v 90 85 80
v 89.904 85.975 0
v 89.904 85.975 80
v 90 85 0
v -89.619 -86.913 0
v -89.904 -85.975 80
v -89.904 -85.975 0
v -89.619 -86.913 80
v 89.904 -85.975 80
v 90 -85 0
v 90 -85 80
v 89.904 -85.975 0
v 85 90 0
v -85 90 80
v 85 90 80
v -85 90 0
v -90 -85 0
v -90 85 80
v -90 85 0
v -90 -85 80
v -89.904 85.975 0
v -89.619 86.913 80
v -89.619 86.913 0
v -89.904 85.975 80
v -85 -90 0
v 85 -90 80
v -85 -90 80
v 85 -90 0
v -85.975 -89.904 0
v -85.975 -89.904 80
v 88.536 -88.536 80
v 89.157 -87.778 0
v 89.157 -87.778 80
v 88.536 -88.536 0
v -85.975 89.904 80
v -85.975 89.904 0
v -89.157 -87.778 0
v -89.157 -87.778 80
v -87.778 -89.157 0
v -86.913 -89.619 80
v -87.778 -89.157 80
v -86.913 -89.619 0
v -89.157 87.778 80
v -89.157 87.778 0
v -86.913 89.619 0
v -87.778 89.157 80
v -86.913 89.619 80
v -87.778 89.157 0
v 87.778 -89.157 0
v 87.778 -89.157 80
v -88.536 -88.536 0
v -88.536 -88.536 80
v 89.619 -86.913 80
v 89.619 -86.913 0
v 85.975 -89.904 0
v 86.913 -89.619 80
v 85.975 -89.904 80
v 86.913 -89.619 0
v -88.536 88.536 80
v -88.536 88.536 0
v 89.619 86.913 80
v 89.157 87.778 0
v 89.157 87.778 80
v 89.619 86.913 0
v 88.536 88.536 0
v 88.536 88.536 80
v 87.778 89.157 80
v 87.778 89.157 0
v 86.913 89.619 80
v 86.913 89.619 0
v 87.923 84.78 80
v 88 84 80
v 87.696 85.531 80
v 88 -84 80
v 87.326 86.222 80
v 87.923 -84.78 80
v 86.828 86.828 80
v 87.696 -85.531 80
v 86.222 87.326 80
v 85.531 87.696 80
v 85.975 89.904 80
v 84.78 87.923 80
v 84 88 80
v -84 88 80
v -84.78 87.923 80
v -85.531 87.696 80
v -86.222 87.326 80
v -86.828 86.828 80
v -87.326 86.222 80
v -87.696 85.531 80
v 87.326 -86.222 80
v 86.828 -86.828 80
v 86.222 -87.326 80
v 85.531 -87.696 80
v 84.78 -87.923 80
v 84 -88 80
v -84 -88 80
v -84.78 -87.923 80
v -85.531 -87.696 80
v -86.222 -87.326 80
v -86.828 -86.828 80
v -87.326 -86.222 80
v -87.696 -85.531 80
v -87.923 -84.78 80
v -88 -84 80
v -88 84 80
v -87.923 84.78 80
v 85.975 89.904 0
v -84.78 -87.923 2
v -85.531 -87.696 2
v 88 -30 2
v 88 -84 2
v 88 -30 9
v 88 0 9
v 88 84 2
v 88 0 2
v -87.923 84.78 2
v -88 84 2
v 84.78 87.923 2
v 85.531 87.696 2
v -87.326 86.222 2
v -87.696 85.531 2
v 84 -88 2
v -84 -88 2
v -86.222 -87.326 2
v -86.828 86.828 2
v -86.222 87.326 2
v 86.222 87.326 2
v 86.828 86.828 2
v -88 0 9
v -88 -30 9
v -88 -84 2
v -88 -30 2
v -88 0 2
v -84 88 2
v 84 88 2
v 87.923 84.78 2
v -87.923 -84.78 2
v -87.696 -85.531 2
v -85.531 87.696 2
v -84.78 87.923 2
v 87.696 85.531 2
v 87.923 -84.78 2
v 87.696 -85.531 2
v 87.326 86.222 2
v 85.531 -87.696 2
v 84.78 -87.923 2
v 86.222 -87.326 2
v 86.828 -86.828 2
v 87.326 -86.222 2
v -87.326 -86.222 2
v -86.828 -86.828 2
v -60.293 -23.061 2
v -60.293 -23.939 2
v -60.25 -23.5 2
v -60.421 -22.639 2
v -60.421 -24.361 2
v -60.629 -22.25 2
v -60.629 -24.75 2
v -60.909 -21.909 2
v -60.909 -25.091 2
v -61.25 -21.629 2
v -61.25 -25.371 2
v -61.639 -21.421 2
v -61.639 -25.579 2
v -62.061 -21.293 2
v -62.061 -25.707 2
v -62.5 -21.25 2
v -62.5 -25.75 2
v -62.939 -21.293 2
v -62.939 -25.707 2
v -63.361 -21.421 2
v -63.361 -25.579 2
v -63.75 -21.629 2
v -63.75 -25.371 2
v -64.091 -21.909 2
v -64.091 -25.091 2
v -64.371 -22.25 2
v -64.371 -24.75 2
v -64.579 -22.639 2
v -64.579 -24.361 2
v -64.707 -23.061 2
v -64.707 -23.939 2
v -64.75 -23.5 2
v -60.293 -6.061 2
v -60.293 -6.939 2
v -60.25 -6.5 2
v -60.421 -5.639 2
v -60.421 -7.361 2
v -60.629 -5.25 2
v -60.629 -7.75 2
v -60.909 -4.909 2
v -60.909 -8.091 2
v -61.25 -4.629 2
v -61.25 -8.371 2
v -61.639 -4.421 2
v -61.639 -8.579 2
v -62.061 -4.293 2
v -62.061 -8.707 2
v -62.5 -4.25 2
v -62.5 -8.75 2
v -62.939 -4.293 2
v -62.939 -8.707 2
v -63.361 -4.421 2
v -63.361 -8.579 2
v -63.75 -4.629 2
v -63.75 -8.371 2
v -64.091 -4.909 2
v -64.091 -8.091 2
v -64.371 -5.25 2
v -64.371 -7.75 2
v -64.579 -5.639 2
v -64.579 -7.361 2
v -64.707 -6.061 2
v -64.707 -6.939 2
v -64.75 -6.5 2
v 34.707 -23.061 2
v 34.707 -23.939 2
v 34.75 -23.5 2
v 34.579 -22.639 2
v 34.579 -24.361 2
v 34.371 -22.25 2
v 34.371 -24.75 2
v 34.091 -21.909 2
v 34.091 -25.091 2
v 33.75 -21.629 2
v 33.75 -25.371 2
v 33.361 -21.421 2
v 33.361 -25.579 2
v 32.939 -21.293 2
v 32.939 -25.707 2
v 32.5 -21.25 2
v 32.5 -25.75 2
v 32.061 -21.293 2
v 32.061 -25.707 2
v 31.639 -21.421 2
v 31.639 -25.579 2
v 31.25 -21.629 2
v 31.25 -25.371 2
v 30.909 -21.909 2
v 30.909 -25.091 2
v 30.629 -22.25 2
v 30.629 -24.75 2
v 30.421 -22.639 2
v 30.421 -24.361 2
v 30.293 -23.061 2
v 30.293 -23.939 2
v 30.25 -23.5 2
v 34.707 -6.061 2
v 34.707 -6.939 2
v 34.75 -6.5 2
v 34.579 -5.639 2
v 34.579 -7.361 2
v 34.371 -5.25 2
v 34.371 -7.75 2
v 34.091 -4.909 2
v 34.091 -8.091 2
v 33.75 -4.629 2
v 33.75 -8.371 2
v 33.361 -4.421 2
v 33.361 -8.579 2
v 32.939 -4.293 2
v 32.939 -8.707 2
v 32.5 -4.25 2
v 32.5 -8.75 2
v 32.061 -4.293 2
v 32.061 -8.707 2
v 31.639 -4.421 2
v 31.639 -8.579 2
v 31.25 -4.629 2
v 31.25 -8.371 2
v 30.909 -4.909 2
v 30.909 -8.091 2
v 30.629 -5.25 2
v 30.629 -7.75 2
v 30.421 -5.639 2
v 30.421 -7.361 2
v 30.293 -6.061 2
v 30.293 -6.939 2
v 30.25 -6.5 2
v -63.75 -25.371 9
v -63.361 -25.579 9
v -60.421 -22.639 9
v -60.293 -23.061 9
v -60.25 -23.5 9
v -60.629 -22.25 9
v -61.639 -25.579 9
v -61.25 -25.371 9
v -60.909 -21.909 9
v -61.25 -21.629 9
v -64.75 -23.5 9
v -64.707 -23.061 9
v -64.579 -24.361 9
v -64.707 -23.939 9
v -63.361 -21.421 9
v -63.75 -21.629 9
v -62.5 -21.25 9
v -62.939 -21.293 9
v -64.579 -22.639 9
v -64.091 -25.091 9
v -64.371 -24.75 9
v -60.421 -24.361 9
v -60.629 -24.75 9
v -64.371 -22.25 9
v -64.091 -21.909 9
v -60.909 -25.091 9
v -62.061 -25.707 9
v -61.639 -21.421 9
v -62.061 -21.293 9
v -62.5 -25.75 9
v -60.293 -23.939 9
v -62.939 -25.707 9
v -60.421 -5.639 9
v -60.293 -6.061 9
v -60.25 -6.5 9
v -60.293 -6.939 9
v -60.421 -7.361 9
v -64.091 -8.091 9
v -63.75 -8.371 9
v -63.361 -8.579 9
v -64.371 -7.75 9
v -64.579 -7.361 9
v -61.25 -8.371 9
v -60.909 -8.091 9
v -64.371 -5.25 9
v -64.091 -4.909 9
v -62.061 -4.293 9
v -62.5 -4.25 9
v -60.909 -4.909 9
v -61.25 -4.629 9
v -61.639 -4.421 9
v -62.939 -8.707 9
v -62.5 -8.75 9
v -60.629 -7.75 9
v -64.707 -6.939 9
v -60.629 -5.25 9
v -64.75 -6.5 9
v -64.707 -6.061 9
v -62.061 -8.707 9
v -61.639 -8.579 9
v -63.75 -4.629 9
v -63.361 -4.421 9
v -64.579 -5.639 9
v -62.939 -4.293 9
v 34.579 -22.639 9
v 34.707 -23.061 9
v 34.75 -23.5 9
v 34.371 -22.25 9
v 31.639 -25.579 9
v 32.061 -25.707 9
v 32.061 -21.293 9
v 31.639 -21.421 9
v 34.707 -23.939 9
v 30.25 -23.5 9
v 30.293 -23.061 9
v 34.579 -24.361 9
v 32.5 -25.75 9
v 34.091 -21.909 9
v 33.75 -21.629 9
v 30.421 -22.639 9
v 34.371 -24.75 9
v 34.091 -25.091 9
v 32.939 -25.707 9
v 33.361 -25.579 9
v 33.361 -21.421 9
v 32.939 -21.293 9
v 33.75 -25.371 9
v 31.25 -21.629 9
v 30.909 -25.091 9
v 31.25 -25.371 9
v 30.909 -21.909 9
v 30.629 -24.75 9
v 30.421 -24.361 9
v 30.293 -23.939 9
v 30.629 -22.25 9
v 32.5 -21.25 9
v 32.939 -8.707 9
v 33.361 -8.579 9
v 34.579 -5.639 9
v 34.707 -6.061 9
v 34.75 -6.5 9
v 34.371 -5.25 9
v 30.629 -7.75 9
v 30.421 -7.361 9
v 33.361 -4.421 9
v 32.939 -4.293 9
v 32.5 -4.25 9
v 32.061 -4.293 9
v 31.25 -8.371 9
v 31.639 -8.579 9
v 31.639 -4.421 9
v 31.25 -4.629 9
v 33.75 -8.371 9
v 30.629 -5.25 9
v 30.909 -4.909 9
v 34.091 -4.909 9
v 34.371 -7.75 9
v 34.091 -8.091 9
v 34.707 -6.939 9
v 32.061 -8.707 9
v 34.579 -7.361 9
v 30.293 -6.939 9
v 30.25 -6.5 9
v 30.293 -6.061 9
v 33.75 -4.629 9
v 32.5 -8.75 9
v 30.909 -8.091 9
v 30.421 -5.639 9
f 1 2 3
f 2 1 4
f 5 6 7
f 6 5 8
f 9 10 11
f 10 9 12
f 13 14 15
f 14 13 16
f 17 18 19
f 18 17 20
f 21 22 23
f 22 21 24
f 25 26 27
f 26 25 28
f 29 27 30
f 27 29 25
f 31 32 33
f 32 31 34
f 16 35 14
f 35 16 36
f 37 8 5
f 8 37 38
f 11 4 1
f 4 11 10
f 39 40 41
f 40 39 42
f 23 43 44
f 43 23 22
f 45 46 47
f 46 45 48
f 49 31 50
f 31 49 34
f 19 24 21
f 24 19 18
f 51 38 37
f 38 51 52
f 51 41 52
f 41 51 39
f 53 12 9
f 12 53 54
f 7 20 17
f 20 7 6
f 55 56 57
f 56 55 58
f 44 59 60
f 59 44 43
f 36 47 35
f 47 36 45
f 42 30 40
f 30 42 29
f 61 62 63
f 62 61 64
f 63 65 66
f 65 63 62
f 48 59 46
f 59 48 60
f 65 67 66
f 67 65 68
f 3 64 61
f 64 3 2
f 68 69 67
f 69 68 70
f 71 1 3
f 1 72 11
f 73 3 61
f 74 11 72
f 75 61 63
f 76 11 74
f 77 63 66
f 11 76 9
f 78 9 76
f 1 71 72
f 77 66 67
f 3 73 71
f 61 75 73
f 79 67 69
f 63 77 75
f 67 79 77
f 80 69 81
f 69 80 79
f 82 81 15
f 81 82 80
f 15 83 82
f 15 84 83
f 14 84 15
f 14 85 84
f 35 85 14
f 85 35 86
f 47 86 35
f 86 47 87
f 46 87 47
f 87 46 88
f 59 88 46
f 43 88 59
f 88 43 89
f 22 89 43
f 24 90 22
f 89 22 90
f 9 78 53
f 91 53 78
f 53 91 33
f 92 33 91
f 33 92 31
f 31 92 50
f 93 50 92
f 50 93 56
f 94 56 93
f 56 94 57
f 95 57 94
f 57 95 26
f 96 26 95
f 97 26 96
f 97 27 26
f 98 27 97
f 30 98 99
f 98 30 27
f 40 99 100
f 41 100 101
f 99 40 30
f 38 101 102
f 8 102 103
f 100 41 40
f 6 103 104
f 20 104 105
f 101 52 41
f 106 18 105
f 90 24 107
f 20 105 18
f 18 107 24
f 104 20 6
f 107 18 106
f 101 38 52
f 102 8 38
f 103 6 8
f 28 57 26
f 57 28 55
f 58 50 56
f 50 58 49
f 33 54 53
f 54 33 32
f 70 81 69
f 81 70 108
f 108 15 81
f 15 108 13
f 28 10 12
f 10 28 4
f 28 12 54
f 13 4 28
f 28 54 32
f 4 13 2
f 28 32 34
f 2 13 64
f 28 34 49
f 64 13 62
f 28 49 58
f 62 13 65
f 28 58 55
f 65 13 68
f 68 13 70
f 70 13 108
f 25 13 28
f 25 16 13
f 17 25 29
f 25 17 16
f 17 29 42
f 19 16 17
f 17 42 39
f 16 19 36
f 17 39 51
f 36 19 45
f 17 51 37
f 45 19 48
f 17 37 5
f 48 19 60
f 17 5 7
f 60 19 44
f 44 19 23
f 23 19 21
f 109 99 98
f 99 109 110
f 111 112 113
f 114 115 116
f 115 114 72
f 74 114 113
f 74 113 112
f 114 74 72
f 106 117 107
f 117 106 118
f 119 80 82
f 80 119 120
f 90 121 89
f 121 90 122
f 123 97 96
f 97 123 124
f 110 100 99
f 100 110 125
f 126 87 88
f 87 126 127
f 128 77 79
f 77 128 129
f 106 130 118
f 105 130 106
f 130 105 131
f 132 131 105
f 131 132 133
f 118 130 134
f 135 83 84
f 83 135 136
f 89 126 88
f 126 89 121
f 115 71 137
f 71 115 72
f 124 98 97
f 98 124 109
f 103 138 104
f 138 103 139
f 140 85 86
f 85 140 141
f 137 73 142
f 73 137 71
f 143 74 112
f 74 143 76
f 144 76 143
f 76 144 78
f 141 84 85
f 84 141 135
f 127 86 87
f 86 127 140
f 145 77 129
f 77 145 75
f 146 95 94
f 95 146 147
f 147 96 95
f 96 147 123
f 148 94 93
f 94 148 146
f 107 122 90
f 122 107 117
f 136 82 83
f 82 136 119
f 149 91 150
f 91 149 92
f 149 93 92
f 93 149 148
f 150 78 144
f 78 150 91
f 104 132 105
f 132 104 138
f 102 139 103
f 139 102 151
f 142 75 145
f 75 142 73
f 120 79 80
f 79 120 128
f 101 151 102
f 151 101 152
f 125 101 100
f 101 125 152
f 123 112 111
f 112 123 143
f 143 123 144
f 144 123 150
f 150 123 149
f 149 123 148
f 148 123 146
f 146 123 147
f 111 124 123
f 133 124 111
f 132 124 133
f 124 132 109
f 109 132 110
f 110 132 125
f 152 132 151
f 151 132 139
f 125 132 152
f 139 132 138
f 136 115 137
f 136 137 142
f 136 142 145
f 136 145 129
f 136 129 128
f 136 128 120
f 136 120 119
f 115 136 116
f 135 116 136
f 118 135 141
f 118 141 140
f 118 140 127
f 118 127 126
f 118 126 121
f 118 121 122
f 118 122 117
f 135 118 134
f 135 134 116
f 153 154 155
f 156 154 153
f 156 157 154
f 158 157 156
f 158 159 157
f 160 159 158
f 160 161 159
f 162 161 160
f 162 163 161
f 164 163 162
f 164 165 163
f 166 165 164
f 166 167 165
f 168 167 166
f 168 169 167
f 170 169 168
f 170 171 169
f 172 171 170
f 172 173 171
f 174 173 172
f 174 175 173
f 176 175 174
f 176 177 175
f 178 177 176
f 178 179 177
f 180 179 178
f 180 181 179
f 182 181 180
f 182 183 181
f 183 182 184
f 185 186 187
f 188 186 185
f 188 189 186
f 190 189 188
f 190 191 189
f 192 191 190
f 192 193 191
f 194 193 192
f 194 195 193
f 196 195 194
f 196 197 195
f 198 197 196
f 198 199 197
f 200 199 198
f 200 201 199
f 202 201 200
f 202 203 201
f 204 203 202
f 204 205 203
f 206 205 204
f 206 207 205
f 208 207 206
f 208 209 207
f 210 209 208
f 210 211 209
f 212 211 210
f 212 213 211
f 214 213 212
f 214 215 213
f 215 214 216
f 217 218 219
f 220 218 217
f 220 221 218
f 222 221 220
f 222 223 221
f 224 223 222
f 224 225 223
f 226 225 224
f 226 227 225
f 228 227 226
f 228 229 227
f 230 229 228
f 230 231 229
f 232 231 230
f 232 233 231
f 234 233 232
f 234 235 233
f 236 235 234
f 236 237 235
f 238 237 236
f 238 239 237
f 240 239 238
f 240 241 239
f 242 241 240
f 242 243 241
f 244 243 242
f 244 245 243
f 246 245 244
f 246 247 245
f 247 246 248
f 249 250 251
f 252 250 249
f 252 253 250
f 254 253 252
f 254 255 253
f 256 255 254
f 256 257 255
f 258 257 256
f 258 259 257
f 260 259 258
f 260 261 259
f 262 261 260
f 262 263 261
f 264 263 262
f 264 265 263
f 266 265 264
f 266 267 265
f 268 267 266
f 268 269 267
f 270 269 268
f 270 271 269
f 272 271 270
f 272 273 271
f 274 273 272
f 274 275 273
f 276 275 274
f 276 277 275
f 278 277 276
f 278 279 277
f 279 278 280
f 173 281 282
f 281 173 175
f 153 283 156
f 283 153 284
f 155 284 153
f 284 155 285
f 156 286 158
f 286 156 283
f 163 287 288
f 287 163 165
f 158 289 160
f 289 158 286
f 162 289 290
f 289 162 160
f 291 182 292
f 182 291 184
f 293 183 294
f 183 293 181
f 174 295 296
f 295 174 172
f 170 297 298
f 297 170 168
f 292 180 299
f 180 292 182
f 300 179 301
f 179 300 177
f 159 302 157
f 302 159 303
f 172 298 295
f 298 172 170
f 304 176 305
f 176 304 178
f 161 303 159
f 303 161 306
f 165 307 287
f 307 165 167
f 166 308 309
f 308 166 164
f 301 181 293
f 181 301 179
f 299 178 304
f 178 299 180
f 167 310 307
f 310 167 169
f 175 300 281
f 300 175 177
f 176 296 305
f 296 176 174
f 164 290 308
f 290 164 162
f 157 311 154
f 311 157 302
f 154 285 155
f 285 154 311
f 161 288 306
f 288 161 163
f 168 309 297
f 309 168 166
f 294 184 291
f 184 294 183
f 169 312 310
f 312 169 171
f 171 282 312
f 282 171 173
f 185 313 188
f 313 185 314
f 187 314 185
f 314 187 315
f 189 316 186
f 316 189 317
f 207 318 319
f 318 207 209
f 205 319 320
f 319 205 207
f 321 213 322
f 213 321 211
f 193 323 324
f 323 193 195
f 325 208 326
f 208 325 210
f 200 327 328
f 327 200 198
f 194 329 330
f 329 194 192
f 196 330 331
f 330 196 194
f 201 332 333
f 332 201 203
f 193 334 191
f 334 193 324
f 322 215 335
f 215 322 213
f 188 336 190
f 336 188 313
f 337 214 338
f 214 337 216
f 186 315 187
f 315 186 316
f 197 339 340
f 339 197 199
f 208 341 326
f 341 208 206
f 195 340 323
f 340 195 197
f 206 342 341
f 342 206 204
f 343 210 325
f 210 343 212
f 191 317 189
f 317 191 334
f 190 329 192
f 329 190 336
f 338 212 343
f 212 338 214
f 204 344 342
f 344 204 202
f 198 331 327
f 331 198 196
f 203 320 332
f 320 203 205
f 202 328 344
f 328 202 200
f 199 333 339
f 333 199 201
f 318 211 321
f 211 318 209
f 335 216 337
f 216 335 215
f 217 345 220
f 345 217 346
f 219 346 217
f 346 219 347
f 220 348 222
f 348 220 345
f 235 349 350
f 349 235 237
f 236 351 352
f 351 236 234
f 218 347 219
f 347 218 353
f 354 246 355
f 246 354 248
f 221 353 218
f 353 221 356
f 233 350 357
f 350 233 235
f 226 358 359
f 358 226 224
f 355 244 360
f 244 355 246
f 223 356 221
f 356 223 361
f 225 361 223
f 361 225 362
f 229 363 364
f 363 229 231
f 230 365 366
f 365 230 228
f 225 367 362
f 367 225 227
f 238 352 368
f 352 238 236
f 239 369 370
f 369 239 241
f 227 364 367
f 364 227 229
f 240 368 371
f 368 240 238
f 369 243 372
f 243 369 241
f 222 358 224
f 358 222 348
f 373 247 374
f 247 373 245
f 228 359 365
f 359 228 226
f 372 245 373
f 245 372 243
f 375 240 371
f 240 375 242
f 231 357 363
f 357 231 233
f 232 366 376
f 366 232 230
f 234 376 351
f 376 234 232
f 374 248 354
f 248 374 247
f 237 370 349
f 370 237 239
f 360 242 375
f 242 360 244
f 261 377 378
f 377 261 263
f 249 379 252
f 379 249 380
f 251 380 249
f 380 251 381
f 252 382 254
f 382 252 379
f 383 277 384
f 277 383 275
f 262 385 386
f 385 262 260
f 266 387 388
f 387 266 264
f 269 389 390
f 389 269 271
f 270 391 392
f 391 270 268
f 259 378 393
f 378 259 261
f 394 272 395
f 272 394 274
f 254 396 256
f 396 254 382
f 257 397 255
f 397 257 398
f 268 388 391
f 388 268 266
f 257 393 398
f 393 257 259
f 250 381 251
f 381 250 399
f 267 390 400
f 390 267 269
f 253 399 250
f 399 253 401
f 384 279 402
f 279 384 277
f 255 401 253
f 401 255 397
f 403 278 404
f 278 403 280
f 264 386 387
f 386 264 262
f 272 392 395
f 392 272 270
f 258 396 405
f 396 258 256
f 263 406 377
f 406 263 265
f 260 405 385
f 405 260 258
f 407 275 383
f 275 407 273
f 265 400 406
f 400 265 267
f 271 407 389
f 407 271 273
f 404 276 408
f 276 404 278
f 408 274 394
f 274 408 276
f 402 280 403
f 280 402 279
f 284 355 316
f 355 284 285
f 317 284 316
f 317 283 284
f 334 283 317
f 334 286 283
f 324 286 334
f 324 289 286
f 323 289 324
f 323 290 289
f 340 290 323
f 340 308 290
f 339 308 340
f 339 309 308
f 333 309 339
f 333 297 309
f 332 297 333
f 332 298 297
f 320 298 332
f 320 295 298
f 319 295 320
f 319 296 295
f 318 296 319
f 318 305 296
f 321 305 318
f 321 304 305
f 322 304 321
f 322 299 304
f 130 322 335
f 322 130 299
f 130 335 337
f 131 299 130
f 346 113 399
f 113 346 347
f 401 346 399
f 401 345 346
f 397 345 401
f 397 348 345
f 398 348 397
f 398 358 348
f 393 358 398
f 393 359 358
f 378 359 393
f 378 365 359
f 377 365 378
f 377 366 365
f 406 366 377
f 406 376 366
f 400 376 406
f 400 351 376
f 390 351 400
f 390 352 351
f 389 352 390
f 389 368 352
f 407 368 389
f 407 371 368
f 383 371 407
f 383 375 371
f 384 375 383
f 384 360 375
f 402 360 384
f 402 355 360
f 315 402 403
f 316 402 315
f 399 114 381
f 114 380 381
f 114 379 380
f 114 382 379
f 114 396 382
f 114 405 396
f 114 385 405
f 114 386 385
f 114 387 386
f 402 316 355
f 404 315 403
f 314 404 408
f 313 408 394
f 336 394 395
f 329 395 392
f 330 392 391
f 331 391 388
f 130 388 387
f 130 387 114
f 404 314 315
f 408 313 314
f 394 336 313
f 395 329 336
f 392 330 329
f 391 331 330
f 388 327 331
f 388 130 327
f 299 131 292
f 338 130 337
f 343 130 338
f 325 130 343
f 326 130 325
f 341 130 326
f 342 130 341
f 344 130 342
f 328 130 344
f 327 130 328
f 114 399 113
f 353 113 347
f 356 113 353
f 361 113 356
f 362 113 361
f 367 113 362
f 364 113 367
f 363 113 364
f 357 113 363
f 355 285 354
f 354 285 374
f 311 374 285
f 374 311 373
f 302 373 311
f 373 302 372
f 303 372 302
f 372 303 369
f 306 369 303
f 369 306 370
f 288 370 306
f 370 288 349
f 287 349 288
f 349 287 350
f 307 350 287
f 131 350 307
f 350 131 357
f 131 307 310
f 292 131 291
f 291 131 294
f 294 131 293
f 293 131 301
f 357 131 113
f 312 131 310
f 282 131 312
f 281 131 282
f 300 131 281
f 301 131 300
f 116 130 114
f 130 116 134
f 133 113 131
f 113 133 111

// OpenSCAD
L=180;
W=180;
H=80;
T=2;
offsetL=30/2;
offsetW=30/2;

difference() {
    cube_center([L,W,H], r=5);
    translate([0,0,2])
    cube_center([L-2*T,W-2*T,H], r=4);
    
}

translate([0,0,2]) {
    translate([0,-offsetW,0]) {
        difference() {
            cube_center([L,30,7]);
            translate([-offsetL,0,0])
            for(s=[-1,1]) for(t=[-1,1])
            translate([s*95/2,t*17/2,0])
            cylinder(d=4.5,h=15,$fn=32);
        }
    }
}

module m3standoff() {
    difference() {
        cylinder(d1=10,d2=7,h=5,$fn=32);
        cylinder(d1=4,d2=4,h=6,$fn=32);
    }
}

module cube_center(dims,r=0) {
    if(r==0) {
        translate([-dims[0]/2, -dims[1]/2, 0])
        cube(dims);
    } else {
        
        minkowski() {
            translate([-dims[0]/2+r, -dims[1]/2+r, 0])
            cube([dims[0]-2*r,dims[1]-2*r,dims[2]]);
            cylinder(r=r,h=0.00001,$fn=32);
        }
    }
}
